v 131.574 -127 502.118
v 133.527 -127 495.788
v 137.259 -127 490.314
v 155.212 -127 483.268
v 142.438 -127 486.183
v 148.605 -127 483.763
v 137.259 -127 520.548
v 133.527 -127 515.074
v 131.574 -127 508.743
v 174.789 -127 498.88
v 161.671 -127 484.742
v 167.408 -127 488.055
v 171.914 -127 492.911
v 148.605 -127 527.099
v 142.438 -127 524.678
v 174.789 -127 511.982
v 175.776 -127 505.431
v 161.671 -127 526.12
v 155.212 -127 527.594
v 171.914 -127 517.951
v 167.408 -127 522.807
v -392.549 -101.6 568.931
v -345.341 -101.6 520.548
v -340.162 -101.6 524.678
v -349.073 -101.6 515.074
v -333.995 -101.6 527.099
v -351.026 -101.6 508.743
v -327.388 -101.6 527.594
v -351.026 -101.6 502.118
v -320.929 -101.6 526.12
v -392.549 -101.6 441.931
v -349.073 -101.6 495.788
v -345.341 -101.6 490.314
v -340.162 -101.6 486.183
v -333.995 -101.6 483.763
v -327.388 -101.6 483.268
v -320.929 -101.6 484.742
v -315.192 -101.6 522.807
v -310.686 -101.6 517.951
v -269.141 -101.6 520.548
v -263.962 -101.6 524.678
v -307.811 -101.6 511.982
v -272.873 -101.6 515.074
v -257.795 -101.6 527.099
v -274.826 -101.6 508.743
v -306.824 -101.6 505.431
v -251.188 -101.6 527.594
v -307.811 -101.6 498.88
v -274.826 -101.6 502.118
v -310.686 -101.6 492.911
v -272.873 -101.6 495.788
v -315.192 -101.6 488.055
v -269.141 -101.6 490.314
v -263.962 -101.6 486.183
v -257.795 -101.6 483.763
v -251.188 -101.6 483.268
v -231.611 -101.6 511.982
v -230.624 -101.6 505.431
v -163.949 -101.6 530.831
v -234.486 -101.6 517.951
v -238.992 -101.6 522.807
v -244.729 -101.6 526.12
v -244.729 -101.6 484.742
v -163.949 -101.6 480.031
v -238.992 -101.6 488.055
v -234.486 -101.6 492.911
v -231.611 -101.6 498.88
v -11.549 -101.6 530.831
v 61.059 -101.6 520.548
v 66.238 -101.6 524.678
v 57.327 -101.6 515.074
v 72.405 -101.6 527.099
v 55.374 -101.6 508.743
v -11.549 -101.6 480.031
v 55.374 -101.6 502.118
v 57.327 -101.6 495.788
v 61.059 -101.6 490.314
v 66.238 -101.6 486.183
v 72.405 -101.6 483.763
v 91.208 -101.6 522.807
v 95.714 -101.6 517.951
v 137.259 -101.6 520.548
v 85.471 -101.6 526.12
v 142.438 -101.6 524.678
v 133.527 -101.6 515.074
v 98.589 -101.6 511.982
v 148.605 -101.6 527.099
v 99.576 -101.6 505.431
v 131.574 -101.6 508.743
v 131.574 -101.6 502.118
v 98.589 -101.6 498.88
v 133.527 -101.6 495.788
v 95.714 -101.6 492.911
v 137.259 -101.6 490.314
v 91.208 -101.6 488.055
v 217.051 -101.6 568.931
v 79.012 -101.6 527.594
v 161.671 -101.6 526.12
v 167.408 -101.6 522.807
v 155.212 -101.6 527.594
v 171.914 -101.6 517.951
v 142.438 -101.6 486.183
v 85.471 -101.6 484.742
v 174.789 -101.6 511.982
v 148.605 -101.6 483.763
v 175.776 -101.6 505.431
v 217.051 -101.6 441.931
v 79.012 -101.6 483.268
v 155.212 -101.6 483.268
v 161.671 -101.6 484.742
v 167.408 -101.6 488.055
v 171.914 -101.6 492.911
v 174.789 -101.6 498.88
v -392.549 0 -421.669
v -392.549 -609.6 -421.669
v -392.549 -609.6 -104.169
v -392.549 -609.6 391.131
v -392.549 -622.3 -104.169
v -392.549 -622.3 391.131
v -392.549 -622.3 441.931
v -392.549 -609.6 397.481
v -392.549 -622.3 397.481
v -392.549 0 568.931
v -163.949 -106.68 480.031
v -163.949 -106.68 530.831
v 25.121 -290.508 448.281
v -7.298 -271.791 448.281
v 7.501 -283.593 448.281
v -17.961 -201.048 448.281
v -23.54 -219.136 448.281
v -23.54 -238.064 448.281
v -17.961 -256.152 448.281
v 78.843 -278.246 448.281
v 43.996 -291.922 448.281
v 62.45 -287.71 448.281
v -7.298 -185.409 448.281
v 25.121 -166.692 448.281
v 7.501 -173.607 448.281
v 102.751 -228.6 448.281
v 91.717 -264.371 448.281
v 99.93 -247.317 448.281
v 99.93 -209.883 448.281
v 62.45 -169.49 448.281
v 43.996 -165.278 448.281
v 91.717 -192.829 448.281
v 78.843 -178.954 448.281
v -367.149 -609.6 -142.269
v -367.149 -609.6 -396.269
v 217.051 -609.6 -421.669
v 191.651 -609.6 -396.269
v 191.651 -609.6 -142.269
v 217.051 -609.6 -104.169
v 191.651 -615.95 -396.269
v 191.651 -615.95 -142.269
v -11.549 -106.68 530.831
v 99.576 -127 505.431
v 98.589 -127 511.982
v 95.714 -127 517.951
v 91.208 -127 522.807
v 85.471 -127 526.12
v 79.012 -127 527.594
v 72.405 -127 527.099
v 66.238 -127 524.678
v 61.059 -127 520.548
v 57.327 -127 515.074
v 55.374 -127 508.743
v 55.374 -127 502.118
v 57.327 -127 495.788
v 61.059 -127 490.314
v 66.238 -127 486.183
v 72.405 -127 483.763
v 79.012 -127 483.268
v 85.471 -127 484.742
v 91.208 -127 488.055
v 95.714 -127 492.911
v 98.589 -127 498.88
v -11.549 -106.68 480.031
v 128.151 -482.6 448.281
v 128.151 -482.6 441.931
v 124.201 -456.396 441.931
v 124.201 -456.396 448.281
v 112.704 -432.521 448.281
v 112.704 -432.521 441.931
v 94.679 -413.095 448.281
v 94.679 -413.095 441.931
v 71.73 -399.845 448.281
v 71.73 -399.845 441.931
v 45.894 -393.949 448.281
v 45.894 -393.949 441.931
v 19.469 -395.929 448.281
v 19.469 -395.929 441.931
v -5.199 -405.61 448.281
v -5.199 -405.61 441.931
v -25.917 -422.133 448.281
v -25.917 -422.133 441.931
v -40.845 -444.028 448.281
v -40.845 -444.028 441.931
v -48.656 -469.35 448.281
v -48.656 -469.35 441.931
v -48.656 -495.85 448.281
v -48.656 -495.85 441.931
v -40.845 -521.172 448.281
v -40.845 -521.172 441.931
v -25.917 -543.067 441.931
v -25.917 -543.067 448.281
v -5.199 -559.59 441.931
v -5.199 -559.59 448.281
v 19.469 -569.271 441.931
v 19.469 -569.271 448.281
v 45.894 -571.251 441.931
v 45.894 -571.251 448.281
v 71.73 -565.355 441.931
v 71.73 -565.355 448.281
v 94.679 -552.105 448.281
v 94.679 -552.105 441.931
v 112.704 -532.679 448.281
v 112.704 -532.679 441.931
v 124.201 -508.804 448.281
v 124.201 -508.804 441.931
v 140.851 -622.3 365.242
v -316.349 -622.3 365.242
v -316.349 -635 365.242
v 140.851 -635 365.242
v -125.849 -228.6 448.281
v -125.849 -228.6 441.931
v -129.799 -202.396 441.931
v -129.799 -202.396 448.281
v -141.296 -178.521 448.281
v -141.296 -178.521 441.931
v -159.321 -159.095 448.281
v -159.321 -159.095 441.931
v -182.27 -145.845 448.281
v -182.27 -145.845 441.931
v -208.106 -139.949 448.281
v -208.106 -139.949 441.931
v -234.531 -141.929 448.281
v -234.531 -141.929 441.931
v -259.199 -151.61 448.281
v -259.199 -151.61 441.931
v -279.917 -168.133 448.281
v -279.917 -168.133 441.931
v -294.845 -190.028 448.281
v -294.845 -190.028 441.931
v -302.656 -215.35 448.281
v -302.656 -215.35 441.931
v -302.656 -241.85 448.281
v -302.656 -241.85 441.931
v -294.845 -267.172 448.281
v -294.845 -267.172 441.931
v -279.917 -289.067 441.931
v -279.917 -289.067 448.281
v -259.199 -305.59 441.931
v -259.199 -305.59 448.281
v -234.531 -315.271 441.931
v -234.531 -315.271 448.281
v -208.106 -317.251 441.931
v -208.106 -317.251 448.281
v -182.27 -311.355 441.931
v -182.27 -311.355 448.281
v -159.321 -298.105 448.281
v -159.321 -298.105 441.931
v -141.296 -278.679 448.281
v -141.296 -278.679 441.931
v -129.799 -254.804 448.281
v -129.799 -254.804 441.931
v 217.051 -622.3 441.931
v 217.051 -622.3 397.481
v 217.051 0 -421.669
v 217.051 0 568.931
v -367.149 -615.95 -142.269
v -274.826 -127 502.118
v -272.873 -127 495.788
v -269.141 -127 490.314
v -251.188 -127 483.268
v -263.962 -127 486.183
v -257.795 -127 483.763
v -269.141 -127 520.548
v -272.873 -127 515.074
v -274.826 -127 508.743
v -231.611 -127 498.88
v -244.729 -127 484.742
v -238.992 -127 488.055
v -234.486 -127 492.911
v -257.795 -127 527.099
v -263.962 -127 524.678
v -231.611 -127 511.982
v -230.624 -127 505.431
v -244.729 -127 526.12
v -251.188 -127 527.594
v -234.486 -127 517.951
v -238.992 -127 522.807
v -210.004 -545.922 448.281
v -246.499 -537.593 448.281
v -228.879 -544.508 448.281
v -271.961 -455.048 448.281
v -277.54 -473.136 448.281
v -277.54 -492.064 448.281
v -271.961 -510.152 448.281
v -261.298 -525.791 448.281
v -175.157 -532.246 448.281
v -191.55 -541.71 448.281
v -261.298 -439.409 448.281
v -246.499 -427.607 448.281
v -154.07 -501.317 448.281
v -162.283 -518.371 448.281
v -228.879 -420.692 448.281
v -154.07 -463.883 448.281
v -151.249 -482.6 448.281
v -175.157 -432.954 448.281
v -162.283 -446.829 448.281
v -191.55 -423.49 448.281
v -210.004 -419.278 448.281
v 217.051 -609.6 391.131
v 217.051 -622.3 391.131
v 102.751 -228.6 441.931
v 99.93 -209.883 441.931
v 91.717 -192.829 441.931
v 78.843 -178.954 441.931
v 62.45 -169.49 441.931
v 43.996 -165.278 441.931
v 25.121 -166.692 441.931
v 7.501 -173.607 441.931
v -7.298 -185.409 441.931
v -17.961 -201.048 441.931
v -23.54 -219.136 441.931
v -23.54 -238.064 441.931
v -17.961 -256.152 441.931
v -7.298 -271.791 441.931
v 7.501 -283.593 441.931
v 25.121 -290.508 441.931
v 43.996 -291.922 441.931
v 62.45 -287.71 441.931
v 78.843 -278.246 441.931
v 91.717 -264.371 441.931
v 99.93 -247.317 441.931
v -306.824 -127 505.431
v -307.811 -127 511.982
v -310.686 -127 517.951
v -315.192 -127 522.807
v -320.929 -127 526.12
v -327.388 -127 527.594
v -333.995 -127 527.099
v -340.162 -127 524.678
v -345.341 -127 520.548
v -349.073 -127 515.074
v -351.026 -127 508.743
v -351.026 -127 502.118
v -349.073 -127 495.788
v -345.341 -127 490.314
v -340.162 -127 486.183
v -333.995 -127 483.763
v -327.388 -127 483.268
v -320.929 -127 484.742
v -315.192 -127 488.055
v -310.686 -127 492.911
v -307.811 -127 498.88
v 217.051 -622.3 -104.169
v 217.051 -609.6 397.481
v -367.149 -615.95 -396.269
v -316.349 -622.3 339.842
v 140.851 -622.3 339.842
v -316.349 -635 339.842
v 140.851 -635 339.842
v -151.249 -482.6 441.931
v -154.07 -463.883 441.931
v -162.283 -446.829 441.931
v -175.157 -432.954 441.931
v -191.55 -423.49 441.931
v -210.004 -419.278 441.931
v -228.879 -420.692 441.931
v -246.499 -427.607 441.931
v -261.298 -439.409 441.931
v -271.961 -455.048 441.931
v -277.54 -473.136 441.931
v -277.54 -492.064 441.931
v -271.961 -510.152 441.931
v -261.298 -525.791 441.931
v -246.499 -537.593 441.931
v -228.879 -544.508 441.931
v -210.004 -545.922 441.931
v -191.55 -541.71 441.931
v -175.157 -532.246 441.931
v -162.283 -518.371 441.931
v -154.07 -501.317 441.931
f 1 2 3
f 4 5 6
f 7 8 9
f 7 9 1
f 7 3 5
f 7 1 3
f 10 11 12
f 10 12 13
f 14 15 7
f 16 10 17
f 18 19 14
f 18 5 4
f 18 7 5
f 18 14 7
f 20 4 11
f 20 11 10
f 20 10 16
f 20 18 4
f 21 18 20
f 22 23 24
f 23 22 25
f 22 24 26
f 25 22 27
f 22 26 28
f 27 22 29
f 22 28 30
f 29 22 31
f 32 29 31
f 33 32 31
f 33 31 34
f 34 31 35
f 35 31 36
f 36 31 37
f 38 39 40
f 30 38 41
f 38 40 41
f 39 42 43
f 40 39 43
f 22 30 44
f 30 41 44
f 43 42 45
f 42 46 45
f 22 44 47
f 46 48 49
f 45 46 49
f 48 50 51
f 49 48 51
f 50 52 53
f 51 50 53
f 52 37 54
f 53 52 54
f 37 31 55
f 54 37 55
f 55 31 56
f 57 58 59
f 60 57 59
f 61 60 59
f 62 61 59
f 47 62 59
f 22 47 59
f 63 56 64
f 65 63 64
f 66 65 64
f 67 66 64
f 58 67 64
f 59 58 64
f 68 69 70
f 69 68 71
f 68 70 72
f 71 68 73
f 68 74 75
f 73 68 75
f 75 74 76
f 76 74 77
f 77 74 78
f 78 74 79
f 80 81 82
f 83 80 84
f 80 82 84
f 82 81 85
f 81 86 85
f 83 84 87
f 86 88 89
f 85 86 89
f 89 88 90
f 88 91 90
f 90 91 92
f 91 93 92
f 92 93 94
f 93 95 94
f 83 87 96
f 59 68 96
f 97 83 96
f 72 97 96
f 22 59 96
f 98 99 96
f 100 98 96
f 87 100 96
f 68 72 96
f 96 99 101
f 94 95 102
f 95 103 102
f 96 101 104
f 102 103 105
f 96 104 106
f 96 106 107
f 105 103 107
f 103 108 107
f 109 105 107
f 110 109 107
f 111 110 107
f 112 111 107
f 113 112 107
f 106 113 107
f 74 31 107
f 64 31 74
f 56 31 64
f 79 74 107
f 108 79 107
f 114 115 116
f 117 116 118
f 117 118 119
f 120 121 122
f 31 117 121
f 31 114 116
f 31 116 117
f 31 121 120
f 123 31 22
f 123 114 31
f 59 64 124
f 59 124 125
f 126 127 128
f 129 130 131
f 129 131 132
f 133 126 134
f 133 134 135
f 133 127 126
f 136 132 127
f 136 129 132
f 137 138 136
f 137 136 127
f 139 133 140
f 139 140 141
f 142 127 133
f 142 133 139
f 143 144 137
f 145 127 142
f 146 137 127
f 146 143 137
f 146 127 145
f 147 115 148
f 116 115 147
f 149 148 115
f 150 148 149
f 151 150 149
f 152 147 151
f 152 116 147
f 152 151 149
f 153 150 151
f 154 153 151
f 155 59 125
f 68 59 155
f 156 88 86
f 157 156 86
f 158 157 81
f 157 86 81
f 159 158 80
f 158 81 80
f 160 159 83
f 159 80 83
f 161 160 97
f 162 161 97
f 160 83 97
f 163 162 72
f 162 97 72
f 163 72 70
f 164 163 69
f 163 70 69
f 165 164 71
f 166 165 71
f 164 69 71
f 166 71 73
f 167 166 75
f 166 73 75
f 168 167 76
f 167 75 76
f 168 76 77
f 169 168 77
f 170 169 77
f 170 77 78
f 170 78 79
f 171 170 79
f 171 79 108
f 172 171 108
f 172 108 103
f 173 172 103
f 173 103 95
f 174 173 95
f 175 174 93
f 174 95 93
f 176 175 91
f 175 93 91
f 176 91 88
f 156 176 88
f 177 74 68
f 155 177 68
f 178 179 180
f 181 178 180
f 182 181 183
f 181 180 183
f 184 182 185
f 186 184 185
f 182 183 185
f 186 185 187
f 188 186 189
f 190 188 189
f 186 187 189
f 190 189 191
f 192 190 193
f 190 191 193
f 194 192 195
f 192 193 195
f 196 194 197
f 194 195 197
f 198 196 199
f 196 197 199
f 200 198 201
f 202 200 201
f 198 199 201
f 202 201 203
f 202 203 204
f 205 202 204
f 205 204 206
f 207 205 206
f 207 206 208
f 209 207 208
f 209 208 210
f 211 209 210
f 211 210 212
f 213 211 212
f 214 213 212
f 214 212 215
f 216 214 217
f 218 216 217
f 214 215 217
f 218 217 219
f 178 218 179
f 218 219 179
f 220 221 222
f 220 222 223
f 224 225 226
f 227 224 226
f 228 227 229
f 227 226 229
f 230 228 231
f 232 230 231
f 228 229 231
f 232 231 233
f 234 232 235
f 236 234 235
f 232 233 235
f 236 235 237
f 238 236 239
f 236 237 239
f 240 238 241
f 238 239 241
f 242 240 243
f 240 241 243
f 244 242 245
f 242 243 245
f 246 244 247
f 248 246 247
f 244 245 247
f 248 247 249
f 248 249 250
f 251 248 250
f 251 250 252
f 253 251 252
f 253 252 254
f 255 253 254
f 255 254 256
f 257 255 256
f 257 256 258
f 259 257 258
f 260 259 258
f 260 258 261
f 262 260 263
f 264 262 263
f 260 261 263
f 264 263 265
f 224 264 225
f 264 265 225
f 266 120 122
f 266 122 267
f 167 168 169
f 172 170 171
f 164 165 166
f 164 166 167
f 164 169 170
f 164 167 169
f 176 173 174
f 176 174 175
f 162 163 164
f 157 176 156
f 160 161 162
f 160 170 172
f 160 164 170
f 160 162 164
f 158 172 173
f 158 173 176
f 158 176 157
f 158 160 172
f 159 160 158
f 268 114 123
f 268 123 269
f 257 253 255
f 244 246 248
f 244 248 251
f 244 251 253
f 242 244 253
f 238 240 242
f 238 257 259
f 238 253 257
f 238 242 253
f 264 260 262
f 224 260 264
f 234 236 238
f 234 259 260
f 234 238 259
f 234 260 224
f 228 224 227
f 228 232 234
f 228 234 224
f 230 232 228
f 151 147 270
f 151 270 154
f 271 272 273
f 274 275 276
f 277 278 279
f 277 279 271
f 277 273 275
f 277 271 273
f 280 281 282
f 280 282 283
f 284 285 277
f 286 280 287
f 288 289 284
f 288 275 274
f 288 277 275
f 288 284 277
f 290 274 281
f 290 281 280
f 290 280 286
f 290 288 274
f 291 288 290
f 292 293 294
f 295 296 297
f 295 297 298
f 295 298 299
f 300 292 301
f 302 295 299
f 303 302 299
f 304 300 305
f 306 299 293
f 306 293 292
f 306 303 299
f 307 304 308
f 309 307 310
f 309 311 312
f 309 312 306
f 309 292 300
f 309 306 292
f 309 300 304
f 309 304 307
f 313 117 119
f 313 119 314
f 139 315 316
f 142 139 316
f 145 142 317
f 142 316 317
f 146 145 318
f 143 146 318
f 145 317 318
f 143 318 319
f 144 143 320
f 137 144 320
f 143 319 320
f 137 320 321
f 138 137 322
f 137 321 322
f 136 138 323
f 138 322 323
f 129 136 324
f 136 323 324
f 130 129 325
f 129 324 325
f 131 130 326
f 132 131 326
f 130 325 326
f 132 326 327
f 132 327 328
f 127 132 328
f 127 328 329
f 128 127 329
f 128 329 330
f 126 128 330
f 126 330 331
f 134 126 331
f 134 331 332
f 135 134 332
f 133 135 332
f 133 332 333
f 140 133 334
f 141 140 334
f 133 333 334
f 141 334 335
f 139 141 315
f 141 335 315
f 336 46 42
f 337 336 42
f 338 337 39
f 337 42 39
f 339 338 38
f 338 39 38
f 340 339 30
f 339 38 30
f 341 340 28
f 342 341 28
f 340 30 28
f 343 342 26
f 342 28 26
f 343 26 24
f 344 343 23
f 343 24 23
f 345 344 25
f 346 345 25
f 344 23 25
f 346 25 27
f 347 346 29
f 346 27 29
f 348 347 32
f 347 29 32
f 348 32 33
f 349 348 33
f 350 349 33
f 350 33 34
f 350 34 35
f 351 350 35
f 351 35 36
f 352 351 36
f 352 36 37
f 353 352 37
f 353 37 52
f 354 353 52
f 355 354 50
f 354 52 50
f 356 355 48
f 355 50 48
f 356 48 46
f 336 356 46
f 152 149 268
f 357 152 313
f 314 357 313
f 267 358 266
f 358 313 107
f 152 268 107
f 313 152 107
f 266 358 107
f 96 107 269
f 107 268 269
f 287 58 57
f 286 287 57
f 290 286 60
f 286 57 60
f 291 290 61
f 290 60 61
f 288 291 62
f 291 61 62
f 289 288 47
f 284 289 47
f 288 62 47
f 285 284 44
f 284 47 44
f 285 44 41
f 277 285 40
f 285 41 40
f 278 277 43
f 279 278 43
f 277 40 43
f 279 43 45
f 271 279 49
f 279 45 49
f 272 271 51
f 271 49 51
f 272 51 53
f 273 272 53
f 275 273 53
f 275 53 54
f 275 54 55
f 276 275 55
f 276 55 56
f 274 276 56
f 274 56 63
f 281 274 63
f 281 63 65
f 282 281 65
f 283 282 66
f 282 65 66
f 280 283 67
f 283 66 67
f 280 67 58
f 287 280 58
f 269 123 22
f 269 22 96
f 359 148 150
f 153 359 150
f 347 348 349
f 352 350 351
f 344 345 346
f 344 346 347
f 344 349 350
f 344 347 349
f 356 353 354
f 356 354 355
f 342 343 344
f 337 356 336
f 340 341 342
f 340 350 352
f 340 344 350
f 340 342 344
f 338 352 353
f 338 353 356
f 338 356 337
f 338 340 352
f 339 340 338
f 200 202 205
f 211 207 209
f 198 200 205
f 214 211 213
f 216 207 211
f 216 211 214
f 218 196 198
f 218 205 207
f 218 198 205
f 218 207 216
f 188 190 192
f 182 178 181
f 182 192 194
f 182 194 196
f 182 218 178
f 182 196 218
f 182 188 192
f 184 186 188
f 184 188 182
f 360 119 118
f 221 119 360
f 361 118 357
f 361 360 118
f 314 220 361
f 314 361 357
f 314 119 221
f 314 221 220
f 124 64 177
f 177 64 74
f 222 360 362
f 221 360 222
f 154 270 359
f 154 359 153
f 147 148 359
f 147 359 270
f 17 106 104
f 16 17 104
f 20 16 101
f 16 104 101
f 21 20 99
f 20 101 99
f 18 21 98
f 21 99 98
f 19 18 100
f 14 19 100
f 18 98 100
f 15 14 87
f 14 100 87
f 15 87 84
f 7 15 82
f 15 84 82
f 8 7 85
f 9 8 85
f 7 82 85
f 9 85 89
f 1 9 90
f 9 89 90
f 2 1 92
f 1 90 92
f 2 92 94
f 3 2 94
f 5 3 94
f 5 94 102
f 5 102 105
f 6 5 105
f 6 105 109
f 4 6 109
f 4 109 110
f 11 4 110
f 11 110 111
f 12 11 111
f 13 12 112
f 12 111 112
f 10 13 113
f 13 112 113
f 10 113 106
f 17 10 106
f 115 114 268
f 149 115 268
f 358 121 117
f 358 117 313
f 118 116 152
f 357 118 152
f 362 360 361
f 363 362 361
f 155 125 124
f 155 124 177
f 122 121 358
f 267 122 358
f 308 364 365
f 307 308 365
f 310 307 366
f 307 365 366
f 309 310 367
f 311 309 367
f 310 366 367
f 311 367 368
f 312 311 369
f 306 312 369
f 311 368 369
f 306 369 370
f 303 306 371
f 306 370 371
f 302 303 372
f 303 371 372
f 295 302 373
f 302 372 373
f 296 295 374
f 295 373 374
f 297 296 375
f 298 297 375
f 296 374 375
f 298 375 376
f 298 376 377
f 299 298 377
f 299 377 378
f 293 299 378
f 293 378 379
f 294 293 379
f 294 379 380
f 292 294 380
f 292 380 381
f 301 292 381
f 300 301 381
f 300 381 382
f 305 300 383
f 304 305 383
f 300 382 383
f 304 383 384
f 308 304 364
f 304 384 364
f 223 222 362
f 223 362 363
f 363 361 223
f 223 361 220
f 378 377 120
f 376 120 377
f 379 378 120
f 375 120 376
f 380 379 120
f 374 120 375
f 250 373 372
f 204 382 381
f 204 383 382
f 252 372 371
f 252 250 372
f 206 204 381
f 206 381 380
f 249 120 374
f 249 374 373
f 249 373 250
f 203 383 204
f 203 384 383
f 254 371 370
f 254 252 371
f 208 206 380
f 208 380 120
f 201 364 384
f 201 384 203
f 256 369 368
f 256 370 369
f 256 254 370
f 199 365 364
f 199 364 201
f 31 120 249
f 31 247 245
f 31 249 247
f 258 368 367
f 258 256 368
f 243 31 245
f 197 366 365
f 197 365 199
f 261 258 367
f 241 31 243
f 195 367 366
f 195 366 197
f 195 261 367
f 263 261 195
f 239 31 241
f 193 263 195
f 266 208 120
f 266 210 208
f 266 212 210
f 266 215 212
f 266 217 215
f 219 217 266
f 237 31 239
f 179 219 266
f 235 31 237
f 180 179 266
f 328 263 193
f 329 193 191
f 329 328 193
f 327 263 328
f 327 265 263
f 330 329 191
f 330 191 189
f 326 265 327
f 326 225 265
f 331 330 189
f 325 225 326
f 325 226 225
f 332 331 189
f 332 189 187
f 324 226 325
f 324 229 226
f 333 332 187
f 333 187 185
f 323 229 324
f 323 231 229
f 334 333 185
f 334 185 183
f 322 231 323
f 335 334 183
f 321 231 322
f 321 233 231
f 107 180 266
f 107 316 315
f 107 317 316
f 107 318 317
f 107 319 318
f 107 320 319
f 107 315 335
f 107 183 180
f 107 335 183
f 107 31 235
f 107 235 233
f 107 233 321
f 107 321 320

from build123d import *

# Parameters (mm, degrees)
F0_W      = 609.6
F0_H      = 863.6
F1_DEPTH  = 609.6
F2_W      = 609.6
F2_H      = 101.6
F3_DEPTH  = 127
F4_R      = 88.9
F4_R_2    = 63.5
F5_DEPTH  = 6.35
F6_W      = 558.8
F6_H      = 254
F7_DEPTH  = 6.35
F8_W      = 609.6
F8_H      = 495.3
F8_H_2    = 44.45
F9_DEPTH  = 12.7
F10_W     = 457.2
F10_H     = 25.4
F11_DEPTH = 12.7
F12_W     = 152.4
F12_H     = 50.8
F13_DEPTH = 5.08
F14_R     = 22.225
F15_DEPTH = 25.4


with BuildPart() as f1:
    # F0 (on Front) → F1 (new body)
    with BuildSketch(Plane.XZ):
        with Locations((-87.74905, 10.130912)):
            Rectangle(F0_W, F0_H)
    extrude(amount=F1_DEPTH)

    # F2 (on face) → F3 (join)
    with BuildSketch(Plane.XY.offset(441.930912)):
        with Locations((-87.74905, -50.8)):
            Rectangle(F2_W, F2_H)
    extrude(amount=F3_DEPTH)

    # F4 (on face) → F5 (join)
    with BuildSketch(Plane.XY.offset(441.930912)):
        with Locations((-214.74905, -228.6)):
            Circle(F4_R)
        with Locations((-214.74905, -482.6)):
            Circle(F4_R_2)
        with Locations((39.25095, -482.6)):
            Circle(F4_R)
        with Locations((39.25095, -228.6)):
            Circle(F4_R_2)
    extrude(amount=F5_DEPTH)

    # F6 (on face) → F7 (join)
    with BuildSketch(Plane.XZ.offset(609.6)):
        with Locations((-87.74905, -269.269088)):
            Rectangle(F6_W, F6_H)
    extrude(amount=F7_DEPTH)

    # F8 (on face) → F9 (join)
    with BuildSketch(Plane.XZ.offset(609.6)):
        with Locations((-87.74905, 143.480912)):
            Rectangle(F8_W, F8_H)
        with Locations((-87.74905, 419.705912)):
            Rectangle(F8_W, F8_H_2)
    extrude(amount=F9_DEPTH)

    # F10 (on face) → F11 (join)
    with BuildSketch(Plane.XZ.offset(622.3)):
        with Locations((-87.74905, 352.542192)):
            Rectangle(F10_W, F10_H)
    extrude(amount=F11_DEPTH)

    # F12 (on face) → F13 (join)
    with BuildSketch(Plane.XZ.offset(101.6)):
        with Locations((-87.74905, 505.430912)):
            Rectangle(F12_W, F12_H)
    extrude(amount=F13_DEPTH)

    # F14 (on face) → F15 (join)
    with BuildSketch(Plane.XZ.offset(101.6)):
        with Locations((-329.04905, 505.430912)):
            Circle(F14_R)
        with Locations((-252.84905, 505.430912)):
            Circle(F14_R)
        with Locations((77.35095, 505.430912)):
            Circle(F14_R)
        with Locations((153.55095, 505.430912)):
            Circle(F14_R)
    extrude(amount=F15_DEPTH)


solid = f1.part
